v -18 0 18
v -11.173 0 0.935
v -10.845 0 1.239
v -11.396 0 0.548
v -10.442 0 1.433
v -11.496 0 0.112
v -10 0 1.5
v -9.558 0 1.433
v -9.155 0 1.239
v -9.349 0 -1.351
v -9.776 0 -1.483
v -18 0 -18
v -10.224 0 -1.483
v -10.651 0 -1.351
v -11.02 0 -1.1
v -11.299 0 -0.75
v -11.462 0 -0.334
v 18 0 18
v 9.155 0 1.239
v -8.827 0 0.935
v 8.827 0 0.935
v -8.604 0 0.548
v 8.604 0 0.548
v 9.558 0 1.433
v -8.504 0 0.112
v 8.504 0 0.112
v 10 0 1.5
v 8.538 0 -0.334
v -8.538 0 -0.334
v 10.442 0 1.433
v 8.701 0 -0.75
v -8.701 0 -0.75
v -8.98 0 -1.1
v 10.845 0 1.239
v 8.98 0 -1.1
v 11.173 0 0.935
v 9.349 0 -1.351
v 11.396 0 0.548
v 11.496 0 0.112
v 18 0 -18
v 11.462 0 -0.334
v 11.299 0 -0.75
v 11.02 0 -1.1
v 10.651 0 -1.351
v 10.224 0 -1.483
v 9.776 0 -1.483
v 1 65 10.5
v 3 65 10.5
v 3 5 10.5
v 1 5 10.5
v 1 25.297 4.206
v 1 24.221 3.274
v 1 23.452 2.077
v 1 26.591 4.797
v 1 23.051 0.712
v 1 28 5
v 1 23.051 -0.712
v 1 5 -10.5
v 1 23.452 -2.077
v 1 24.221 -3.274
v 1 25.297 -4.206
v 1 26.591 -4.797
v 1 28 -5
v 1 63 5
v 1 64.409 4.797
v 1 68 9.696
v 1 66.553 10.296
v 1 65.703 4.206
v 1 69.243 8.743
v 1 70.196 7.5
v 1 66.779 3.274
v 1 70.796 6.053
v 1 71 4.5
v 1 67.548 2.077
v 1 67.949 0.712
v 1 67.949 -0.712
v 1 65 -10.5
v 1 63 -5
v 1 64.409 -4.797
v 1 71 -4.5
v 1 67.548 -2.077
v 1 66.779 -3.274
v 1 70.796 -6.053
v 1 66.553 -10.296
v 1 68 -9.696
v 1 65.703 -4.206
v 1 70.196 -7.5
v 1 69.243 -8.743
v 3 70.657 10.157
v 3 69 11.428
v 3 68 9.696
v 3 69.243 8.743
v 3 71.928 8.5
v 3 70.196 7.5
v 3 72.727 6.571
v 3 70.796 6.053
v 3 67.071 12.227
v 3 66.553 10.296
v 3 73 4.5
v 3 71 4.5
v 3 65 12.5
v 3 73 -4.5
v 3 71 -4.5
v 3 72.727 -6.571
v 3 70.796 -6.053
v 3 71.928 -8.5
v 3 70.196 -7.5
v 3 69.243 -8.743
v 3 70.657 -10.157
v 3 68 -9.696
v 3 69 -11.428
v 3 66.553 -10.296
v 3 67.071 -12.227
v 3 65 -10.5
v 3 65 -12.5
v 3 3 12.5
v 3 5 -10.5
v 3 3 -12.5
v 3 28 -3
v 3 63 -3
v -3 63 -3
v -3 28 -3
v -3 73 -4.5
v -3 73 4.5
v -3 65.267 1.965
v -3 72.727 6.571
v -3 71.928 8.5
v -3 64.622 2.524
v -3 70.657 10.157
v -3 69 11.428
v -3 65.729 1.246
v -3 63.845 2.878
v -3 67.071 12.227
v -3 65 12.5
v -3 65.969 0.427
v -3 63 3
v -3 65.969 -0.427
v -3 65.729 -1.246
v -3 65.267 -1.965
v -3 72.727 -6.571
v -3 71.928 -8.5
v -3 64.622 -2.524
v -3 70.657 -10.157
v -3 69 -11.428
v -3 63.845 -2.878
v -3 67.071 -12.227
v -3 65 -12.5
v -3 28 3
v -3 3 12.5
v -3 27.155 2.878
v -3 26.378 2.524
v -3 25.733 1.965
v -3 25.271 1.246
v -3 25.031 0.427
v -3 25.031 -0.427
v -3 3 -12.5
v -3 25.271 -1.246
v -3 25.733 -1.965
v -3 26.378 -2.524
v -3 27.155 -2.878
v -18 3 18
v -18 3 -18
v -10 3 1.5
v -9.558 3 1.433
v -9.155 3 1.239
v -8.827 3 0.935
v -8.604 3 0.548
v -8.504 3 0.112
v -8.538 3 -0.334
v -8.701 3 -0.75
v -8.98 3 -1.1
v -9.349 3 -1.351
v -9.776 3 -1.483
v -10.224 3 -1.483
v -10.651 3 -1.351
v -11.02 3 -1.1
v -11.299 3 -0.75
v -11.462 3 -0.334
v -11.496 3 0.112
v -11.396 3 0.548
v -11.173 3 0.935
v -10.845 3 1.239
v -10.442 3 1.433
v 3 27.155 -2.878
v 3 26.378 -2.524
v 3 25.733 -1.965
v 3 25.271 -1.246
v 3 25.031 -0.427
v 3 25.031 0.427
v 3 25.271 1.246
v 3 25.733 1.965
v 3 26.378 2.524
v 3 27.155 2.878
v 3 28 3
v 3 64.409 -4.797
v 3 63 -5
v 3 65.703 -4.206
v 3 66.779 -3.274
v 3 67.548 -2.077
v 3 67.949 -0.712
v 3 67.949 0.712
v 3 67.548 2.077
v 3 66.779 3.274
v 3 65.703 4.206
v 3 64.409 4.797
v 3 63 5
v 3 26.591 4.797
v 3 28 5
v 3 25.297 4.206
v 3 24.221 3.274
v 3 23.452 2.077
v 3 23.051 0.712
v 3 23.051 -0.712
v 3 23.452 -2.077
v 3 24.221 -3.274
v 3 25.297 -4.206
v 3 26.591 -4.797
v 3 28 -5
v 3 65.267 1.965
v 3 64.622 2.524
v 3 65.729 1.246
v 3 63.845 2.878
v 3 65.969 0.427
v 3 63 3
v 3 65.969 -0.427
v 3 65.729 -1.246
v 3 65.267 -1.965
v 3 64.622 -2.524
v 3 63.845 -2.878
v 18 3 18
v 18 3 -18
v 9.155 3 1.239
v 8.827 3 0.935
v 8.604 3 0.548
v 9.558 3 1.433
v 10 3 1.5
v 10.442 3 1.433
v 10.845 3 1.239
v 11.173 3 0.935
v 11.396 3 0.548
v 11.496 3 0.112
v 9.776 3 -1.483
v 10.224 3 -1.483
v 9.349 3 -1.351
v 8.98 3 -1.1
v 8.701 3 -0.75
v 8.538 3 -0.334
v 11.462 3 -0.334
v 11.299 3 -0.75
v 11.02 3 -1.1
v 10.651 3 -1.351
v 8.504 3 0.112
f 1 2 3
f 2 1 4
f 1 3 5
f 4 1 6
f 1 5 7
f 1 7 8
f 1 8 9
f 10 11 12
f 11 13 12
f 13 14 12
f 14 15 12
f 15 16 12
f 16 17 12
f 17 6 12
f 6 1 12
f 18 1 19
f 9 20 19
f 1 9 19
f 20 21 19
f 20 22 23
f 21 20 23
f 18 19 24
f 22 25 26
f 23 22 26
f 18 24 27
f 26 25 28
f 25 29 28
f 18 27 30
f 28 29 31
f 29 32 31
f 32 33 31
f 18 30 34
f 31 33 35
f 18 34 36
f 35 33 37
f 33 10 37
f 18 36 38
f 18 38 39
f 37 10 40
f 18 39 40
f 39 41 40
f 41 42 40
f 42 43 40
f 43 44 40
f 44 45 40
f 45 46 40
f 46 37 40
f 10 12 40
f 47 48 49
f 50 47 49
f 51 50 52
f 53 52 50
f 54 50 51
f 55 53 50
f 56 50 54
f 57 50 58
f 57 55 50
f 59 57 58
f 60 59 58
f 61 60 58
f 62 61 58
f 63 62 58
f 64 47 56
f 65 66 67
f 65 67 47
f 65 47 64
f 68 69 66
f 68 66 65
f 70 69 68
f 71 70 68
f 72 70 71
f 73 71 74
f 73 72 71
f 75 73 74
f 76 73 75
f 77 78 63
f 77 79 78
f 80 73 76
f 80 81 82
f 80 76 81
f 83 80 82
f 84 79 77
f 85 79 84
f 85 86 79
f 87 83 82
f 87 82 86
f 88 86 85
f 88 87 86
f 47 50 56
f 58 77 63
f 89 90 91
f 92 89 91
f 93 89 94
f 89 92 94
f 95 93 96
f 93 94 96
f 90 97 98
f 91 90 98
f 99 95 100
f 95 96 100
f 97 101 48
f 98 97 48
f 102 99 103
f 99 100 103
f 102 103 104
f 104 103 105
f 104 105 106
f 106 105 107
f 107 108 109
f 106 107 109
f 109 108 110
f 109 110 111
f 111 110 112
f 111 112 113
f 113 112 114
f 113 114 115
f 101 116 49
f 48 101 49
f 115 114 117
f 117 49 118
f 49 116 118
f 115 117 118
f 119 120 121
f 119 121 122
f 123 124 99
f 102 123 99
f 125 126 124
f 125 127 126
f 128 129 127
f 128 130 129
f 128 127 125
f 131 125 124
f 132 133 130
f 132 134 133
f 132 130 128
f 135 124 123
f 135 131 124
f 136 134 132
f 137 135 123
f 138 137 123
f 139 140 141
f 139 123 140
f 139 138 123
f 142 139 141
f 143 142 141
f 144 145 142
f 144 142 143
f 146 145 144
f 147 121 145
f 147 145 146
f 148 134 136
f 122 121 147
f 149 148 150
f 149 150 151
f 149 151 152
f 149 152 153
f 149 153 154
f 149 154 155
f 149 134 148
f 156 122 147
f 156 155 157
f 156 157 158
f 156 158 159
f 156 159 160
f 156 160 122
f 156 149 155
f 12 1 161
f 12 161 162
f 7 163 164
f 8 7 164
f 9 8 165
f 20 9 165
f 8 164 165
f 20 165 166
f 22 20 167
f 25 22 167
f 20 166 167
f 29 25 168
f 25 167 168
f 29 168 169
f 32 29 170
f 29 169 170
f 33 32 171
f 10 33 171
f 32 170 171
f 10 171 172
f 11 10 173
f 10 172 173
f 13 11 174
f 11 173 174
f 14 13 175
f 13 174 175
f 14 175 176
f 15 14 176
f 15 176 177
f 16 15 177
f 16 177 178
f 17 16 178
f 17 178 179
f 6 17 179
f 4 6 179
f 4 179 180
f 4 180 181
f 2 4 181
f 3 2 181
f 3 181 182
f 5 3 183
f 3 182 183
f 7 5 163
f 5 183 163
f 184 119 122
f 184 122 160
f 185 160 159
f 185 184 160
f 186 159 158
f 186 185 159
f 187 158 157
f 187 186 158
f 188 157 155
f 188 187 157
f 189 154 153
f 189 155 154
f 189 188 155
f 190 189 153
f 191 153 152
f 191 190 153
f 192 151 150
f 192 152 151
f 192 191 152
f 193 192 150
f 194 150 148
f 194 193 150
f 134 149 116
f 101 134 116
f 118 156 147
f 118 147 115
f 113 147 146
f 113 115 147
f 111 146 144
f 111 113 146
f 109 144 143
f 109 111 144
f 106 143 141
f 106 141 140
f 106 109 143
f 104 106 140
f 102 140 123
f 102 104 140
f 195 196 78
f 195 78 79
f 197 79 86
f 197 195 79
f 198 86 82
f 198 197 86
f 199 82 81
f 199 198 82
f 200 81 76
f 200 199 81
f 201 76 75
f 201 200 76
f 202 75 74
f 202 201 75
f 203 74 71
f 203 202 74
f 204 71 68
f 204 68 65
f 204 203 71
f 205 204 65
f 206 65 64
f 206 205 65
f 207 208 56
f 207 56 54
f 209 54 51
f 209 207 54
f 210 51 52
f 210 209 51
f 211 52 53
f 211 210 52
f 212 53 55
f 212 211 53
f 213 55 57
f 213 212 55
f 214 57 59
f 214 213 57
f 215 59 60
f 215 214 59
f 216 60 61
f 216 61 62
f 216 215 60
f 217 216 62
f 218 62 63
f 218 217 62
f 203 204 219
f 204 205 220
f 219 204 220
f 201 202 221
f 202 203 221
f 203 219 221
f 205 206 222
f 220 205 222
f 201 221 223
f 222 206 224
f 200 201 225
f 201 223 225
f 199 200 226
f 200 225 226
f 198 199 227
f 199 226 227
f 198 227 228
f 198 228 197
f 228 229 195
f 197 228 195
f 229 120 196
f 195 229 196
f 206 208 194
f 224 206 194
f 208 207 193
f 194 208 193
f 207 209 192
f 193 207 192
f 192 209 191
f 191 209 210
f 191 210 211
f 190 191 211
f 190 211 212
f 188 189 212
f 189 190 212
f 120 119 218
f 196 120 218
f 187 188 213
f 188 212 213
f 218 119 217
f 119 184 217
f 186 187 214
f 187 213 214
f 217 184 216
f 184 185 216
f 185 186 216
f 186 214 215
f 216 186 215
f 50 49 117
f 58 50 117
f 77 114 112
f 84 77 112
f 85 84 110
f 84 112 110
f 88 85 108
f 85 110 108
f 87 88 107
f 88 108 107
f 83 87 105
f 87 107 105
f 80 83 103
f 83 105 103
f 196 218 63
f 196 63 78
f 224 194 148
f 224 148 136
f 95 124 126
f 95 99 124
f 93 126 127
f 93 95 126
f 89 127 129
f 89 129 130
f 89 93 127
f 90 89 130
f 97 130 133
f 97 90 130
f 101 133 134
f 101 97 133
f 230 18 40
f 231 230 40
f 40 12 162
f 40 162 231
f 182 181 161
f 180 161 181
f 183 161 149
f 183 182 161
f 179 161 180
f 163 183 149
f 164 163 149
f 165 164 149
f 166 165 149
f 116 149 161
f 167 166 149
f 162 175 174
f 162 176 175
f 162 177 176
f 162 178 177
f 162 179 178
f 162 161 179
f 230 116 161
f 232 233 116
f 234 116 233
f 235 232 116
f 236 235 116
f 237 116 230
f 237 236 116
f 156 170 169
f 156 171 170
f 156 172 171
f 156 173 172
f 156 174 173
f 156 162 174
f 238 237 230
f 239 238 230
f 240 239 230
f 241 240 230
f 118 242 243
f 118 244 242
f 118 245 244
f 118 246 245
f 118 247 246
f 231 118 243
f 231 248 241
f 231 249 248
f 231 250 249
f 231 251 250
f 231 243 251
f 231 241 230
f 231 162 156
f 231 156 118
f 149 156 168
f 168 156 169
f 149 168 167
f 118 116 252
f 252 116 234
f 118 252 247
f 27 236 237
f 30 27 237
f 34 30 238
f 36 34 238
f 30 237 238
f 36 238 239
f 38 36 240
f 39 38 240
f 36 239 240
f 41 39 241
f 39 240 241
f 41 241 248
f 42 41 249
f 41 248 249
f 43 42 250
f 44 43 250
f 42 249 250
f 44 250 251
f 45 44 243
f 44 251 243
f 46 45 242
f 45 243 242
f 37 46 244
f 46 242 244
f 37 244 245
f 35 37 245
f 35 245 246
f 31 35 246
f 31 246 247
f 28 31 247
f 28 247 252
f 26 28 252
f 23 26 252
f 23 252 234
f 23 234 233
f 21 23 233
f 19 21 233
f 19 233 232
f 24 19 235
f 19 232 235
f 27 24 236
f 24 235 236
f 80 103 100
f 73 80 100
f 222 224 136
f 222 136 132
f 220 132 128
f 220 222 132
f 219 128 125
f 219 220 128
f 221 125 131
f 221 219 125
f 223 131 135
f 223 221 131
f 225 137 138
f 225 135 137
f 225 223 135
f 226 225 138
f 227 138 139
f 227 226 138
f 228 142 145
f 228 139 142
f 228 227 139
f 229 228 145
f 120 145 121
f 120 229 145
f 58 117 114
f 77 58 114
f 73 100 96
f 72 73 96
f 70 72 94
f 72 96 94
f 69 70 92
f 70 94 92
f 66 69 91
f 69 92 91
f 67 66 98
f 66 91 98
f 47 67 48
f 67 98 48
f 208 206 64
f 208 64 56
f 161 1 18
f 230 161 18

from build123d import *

# Parameters (mm, degrees)
SKETCH1_W           = 36
SKETCH1_H           = 36
BOSS_EXTRUDE1_DEPTH = 3
SKETCH2_R           = 1.5
CUT_EXTRUDE1_DEPTH  = 3
SKETCH3_W           = 6
SKETCH3_H           = 25
BOSS_EXTRUDE2_DEPTH = 70
CUT_EXTRUDE2_DEPTH  = 70
FILLET1_R           = 8
FILLET2_R           = 8
CUT_EXTRUDE3_DEPTH  = 2


with BuildPart() as part:
    # Sketch1 → Boss-Extrude1 (new body)
    with BuildSketch(Plane(origin=(0, 0, 0), x_dir=(1, 0, 0), z_dir=(0, 1, 0))):
        Rectangle(SKETCH1_W, SKETCH1_H)
    extrude(amount=BOSS_EXTRUDE1_DEPTH)

    # Sketch2 → Cut-Extrude1 (cut)
    with BuildSketch(Plane(origin=(0, 3, 0), x_dir=(1, 0, 0), z_dir=(0, 1, 0))):
        with Locations(Location((10, 0, 0), (0, 0, 270))):
            Circle(SKETCH2_R)
        with Locations(Location((-10, 0, 0), (0, 0, 270))):
            Circle(SKETCH2_R)
    extrude(amount=-CUT_EXTRUDE1_DEPTH, mode=Mode.SUBTRACT)

    # Sketch3 → Boss-Extrude2 (add)
    with BuildSketch(Plane(origin=(0, 3, 0), x_dir=(1, 0, 0), z_dir=(0, 1, 0))):
        Rectangle(SKETCH3_W, SKETCH3_H)
    extrude(amount=BOSS_EXTRUDE2_DEPTH)

    # Sketch4 → Cut-Extrude2 (cut)
    with BuildSketch(Plane(origin=(3, 0, 0), x_dir=(0, 0, -1), z_dir=(1, 0, 0))):
        with BuildLine():
            Line((-3, 28), (-3, 63))
            ThreePointArc((-3, 63), (0, 66), (3, 63))
            Line((3, 63), (3, 28))
            ThreePointArc((3, 28), (0, 25), (-3, 28))
        make_face()
    extrude(amount=-CUT_EXTRUDE2_DEPTH, mode=Mode.SUBTRACT)

    # Fillet1
    fillet1_edges = [part.edges().sort_by_distance(p)[0] for p in [
        (0, 73, -12.5),
    ]]
    fillet(fillet1_edges, radius=FILLET1_R)

    # Fillet2
    fillet2_edges = [part.edges().sort_by_distance(p)[0] for p in [
        (0, 73, 12.5),
    ]]
    fillet(fillet2_edges, radius=FILLET2_R)

    # Sketch5 → Cut-Extrude3 (cut)
    with BuildSketch(Plane(origin=(3, 0, 0), x_dir=(0, 0, -1), z_dir=(1, 0, 0))):
        with BuildLine():
            Line((4.5, 71), (-4.5, 71))
            ThreePointArc((-4.5, 71), (-8.742640687, 69.242640687), (-10.5, 65))
            Line((-10.5, 65), (-10.5, 5))
            Line((-10.5, 5), (10.5, 5))
            Line((10.5, 5), (10.5, 65))
            ThreePointArc((10.5, 65), (8.742640687, 69.242640687), (4.5, 71))
        make_face()
        with BuildLine():
            Line((5, 28), (5, 63))
            ThreePointArc((5, 63), (0, 68), (-5, 63))
            Line((-5, 63), (-5, 28))
            ThreePointArc((-5, 28), (0, 23), (5, 28))
        make_face(mode=Mode.SUBTRACT)
    extrude(amount=-CUT_EXTRUDE3_DEPTH, mode=Mode.SUBTRACT)


solid = part.part
